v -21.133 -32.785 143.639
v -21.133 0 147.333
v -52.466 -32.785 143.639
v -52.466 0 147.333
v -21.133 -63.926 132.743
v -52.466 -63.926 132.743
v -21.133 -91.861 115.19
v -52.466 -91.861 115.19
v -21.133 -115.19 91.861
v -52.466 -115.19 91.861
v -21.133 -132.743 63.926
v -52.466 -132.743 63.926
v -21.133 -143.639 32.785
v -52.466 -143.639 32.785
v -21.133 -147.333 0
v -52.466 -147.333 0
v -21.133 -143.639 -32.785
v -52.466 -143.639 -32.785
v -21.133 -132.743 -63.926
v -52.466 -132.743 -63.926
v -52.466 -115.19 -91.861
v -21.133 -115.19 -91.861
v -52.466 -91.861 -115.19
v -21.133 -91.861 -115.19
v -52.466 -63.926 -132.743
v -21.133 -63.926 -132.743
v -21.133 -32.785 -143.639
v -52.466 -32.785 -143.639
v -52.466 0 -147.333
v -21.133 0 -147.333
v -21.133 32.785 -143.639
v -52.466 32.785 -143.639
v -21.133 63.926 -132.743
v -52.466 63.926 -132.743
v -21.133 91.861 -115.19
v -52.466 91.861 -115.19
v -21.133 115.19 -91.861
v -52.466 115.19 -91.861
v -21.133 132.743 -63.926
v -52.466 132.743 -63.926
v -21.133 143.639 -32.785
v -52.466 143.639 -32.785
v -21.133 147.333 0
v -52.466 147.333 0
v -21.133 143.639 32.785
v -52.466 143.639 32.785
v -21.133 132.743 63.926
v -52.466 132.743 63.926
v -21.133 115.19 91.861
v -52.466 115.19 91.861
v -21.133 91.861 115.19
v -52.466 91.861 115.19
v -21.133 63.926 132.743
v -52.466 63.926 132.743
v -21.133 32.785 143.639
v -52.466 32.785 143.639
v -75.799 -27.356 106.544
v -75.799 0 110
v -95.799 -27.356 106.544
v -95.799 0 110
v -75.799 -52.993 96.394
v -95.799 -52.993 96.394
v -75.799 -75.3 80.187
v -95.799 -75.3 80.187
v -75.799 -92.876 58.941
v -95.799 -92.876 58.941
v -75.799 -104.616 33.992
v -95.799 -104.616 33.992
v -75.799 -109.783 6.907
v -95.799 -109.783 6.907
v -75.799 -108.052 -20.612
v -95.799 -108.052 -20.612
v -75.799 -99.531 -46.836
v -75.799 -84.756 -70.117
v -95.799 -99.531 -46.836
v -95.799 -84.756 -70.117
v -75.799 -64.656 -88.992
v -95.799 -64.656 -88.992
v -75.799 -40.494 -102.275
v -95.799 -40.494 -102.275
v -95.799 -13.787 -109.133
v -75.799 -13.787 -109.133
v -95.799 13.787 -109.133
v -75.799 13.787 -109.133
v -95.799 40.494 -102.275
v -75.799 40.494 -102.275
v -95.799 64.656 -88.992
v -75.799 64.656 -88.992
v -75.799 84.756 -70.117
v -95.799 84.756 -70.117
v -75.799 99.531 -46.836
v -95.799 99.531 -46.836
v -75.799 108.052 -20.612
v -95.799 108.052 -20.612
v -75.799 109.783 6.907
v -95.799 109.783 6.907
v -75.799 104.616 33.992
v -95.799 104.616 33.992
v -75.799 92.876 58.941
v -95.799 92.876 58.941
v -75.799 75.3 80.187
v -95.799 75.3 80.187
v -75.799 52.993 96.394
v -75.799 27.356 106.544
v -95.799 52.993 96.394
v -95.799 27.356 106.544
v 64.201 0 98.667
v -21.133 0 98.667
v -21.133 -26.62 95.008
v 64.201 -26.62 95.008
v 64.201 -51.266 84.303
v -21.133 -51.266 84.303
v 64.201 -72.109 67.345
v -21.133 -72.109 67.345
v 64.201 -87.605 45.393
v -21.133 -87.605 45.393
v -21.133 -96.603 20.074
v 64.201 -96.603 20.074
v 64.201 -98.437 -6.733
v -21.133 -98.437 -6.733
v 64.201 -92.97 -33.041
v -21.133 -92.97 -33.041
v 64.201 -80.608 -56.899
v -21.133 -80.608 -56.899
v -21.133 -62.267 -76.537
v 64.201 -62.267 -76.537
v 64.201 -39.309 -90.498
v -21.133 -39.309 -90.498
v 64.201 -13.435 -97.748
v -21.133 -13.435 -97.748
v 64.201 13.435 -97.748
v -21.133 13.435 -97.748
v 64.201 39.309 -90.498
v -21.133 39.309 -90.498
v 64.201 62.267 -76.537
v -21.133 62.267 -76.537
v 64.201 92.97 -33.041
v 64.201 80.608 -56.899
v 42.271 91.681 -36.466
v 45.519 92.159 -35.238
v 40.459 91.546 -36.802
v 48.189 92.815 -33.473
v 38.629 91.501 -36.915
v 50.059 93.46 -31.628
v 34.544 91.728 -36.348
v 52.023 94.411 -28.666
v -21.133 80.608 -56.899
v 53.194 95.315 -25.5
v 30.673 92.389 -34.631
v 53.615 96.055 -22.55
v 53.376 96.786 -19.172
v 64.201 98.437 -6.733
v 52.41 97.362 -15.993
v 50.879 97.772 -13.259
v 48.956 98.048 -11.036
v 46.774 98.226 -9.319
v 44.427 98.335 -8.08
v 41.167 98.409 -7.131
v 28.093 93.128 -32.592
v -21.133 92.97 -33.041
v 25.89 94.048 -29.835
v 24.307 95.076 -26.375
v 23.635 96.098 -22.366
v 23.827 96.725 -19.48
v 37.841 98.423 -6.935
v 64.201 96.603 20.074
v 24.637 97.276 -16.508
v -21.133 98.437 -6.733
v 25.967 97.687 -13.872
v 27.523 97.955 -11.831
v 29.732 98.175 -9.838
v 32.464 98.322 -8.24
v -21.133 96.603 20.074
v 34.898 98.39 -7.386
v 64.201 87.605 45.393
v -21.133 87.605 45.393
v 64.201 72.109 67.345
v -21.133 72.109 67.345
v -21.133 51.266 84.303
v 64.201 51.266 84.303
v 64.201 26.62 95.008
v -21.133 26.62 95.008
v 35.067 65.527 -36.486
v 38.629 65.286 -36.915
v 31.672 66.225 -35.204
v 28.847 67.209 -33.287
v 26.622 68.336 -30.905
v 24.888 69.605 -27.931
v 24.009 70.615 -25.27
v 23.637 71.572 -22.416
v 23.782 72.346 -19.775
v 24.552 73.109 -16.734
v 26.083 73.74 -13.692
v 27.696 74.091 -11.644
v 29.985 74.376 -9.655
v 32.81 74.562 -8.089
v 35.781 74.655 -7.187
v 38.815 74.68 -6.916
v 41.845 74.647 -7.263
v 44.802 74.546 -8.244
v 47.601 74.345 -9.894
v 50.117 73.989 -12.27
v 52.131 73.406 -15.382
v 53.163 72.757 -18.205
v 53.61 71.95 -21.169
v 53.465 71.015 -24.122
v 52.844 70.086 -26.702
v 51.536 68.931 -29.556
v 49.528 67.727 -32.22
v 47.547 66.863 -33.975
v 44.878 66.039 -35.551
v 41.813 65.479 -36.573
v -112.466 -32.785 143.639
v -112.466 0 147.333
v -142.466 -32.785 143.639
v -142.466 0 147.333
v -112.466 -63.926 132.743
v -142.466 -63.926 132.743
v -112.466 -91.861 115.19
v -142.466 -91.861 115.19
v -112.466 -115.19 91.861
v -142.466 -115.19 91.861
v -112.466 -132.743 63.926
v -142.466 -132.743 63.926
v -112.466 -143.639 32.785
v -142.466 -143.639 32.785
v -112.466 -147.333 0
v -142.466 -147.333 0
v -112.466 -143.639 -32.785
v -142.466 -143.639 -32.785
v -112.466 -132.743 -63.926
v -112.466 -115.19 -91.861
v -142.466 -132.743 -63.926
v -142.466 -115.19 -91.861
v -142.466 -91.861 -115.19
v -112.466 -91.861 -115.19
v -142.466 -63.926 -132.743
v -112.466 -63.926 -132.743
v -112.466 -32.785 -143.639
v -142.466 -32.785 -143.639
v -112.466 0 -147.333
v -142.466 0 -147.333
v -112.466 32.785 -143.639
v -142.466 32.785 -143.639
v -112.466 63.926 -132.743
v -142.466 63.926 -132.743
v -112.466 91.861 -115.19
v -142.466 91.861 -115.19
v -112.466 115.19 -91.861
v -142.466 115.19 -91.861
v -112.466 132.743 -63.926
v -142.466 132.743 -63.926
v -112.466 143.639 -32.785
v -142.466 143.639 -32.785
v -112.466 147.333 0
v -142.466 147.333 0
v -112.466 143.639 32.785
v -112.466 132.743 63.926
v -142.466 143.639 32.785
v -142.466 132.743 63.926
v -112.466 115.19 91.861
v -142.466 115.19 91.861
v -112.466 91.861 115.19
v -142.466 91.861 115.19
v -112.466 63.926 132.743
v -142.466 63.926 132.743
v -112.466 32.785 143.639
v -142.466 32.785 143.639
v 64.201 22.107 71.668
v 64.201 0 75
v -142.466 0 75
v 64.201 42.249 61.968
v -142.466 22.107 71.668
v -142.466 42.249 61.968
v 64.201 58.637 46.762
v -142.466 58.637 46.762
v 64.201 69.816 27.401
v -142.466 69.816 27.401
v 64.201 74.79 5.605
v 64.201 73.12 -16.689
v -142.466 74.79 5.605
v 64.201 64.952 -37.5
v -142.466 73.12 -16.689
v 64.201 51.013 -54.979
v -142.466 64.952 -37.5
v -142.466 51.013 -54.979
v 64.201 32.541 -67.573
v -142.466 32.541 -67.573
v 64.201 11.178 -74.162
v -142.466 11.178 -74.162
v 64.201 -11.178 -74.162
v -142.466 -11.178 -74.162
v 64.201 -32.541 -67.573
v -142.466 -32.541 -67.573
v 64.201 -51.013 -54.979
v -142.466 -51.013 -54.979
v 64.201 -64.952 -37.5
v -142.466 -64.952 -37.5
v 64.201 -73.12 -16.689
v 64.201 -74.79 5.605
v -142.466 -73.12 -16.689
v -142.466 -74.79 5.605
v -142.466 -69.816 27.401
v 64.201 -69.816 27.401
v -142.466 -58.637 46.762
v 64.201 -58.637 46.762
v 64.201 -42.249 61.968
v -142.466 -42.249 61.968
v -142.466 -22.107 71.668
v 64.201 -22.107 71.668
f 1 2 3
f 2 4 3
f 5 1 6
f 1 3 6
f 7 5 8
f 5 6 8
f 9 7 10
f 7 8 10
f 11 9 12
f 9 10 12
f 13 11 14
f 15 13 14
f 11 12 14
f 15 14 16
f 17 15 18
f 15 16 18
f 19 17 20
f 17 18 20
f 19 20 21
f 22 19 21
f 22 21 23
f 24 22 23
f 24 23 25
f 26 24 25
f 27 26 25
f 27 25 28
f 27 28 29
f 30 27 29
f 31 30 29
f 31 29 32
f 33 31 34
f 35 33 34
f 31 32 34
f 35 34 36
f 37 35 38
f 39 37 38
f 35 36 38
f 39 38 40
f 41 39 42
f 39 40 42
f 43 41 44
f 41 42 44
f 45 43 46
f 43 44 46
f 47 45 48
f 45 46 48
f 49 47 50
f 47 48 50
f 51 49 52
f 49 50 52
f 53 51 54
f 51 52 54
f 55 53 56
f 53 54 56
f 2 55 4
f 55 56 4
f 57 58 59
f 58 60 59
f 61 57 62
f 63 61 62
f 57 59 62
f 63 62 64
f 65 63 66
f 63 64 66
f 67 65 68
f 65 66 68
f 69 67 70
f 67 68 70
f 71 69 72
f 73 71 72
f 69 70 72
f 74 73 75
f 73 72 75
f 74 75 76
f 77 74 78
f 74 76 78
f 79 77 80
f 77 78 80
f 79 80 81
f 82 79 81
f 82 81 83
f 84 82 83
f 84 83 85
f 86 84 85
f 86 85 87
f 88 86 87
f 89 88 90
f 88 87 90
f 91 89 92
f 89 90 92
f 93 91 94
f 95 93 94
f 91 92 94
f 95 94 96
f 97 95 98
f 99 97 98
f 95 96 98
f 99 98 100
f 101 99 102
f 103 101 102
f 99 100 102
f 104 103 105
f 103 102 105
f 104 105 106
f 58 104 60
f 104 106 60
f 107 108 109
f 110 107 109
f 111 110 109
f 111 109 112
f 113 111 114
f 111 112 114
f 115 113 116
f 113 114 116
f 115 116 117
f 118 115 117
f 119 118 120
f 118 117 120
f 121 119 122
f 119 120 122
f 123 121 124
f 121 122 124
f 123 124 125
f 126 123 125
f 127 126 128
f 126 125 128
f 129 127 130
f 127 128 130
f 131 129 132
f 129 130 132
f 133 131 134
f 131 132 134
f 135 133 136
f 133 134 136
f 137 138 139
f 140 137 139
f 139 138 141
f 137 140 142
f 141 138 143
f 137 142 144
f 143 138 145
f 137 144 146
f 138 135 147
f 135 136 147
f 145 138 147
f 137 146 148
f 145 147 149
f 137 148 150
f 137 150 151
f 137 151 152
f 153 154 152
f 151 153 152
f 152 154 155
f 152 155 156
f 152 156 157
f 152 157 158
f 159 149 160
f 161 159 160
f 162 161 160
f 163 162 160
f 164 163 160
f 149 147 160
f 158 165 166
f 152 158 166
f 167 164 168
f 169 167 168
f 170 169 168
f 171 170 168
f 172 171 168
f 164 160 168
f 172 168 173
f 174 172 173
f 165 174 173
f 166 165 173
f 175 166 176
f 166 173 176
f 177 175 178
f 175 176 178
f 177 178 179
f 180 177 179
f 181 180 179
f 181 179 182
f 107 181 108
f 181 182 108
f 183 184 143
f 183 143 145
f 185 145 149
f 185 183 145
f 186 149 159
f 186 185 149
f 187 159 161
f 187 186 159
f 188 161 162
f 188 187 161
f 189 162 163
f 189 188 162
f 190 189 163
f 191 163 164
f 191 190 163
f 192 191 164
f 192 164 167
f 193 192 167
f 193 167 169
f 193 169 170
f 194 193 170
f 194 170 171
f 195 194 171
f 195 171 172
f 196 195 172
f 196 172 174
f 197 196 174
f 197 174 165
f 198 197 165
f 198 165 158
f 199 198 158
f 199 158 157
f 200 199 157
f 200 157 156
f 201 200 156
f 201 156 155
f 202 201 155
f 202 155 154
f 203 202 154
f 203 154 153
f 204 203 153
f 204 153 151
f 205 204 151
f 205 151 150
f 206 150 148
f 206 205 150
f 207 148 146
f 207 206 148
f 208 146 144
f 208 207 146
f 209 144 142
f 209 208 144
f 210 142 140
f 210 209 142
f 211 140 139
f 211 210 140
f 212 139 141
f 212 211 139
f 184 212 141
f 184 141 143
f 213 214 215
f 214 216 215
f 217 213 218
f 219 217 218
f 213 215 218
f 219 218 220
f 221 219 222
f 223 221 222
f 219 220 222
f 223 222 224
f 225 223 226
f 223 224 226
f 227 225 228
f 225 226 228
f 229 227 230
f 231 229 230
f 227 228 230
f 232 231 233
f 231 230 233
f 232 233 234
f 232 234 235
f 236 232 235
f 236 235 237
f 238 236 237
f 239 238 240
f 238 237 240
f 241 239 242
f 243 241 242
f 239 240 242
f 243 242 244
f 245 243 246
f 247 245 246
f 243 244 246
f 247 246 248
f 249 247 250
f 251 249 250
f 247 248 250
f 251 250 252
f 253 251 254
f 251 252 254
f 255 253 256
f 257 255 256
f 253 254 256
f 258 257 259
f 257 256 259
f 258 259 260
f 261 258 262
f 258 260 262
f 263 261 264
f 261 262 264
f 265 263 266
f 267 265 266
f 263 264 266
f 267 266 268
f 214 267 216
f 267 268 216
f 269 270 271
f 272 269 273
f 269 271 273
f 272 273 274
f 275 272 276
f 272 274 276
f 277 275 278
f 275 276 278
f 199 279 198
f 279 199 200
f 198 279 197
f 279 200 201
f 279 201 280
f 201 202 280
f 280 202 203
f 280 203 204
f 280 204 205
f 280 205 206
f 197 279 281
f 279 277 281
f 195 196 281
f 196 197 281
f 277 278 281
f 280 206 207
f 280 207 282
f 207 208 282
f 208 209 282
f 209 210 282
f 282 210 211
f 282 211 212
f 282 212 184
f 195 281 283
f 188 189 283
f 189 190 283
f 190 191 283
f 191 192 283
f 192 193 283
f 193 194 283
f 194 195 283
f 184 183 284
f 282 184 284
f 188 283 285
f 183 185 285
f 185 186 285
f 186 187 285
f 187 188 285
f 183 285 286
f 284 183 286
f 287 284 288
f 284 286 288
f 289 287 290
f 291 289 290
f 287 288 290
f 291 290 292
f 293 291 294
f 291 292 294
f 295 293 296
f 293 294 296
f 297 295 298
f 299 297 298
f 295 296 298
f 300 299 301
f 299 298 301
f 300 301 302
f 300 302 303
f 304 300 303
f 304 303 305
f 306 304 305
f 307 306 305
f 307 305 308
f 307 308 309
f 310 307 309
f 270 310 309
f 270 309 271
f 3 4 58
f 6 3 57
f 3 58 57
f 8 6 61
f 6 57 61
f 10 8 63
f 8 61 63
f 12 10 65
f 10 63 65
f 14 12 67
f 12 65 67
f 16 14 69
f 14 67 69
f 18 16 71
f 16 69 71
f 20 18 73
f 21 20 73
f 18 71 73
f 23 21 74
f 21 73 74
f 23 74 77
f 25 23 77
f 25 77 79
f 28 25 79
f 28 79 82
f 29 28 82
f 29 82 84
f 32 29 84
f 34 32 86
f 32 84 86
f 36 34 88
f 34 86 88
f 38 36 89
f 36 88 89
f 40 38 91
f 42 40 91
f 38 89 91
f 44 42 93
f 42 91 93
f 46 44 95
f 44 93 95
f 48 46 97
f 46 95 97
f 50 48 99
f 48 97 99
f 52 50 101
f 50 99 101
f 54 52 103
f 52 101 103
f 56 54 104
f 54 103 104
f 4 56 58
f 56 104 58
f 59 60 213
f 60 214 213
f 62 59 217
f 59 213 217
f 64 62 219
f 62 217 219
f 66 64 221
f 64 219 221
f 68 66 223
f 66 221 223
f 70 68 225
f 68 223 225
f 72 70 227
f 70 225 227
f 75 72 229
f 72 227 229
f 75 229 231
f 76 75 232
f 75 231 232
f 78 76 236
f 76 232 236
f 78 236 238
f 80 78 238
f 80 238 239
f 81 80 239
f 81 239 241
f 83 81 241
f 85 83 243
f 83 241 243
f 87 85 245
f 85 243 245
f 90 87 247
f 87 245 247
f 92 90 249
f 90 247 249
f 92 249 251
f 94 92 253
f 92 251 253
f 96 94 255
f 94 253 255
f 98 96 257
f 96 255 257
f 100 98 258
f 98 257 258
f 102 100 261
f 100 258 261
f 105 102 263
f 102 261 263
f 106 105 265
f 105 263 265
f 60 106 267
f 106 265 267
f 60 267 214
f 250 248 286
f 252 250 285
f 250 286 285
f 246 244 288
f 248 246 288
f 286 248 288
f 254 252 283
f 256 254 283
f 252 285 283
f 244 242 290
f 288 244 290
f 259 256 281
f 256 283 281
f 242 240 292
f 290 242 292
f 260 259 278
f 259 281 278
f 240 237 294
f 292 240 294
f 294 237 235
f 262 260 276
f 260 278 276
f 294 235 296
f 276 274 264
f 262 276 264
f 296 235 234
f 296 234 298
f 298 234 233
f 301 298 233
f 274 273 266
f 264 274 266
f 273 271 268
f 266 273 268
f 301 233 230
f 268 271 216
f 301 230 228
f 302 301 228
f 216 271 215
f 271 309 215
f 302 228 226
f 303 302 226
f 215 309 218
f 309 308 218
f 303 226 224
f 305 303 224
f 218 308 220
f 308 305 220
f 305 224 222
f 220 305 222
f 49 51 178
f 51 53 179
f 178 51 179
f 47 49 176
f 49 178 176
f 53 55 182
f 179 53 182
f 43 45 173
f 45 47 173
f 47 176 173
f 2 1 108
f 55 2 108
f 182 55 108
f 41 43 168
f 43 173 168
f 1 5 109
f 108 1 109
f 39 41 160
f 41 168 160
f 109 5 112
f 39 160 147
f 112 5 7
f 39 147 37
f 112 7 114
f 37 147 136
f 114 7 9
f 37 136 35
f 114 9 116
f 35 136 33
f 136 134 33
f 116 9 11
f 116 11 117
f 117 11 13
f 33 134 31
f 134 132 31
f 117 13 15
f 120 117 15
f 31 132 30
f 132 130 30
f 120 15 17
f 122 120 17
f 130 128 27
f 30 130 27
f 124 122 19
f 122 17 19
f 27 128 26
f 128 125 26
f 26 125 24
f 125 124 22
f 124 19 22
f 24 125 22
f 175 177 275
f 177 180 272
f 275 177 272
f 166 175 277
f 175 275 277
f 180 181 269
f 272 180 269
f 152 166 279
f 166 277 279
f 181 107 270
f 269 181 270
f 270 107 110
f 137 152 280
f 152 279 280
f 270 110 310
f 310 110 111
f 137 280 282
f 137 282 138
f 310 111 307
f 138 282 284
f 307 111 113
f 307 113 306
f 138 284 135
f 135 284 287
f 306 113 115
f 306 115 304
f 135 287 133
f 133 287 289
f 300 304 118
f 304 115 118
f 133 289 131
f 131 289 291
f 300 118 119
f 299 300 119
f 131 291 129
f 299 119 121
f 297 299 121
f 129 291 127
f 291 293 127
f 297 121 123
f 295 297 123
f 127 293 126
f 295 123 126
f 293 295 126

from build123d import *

# Parameters (mm, degrees)
SKETCH1_W          = 201.666666667
SKETCH1_H          = 73.666666667
SKETCH9_R          = 75
CUT_EXTRUDE1_DEPTH = 294.471179732
SKETCH14_R         = 15
CUT_EXTRUDE4_DEPTH = 268.773118171


with BuildPart() as part:
    # Sketch1 → Revolve4 (revolve)
    with BuildSketch(Plane.XY, mode=Mode.PRIVATE) as revolve4_sk:
        with Locations((-36.632641292, 36.833333334)):
            Rectangle(SKETCH1_W, SKETCH1_H)
        Polygon((-112.465974625, 147.333333333), (-142.465974625, 147.333333333), (-142.465974625, 0), (-137.465974625, 0), (-137.465974625, 73.666666667), (64.200692042, 73.666666667), (64.200692042, 98.666666667), (-21.132641292, 98.666666667), (-21.132641292, 147.333333333), (-52.465974625, 147.333333333), (-75.799307958, 110), (-95.799307958, 110), align=None)
    revolve(revolve4_sk.sketch.rotate(Axis((-184.465974625, 0, 0), (1, 0, 0)), 90), axis=Axis((-184.465974625, 0, 0), (1, 0, 0)))

    # Sketch9 → Cut-Extrude1 (cut, through all)
    with BuildSketch(Plane.ZY.offset(142.465974625)):
        Circle(SKETCH9_R)
    extrude(amount=-CUT_EXTRUDE1_DEPTH, mode=Mode.SUBTRACT)

    # Sketch14 → Cut-Extrude4 (cut, through all)
    with BuildSketch(Plane(origin=(0, 25, 0), x_dir=(1, 0, 0), z_dir=(0, 1, 0))):
        with Locations(Location((38.628593536, 21.914529815, 0), (0, 0, 90))):
            Circle(SKETCH14_R)
    extrude(amount=CUT_EXTRUDE4_DEPTH, mode=Mode.SUBTRACT)


solid = part.part
